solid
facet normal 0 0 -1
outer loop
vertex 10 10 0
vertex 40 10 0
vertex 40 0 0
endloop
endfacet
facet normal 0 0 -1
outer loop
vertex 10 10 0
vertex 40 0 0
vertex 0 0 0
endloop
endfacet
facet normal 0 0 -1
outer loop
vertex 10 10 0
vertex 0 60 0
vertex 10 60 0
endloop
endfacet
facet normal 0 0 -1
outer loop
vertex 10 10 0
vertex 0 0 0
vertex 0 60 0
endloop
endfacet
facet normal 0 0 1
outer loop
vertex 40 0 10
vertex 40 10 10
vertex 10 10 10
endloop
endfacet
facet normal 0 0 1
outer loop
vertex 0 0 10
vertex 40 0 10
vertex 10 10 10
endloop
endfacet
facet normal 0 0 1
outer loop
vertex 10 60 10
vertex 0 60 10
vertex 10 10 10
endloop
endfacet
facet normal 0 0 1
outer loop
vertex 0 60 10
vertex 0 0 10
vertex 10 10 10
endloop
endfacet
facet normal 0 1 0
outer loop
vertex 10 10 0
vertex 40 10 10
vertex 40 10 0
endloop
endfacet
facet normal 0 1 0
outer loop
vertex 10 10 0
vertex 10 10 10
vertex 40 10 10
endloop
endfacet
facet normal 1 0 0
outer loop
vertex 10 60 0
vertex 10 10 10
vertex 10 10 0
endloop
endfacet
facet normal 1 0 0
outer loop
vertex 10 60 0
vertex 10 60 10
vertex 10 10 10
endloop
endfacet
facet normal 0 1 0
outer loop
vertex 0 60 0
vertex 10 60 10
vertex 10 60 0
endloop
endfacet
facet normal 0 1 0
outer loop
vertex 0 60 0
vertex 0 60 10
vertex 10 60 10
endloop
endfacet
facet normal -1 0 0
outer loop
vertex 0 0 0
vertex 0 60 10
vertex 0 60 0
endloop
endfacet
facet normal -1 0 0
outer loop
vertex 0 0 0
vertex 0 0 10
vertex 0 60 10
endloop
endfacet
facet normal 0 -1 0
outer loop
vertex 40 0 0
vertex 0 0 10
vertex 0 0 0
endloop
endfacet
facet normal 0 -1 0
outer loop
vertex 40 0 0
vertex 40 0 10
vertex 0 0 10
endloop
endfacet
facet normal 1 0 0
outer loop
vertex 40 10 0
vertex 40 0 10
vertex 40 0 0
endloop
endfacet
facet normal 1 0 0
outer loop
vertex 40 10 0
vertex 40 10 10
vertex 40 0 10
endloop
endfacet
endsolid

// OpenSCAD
// Generated by Parametrix
ca_lettreL_face1_000 = [ [ 0.0000, 0.0000 ],[ 40.0000, 0.0000 ],[ 40.0000, 10.0000 ],[ 10.0000, 10.0000 ],[ 10.0000, 60.0000 ],[ 0.0000, 60.0000 ],[ 0.0000, 0.0000 ] ];
cb_lettreL_face1_000 = [  0, 1, 2, 3, 4, 5, 6 ];
a_lettreL_face1 = concat(ca_lettreL_face1_000);
b_lettreL_face1 = [cb_lettreL_face1_000];

module subpax_lettreL () {
	translate( [ 0, 0, 0 ])
		rotate( [ 0, 0, 0 ])
			   linear_extrude(height = 10) polygon(a_lettreL_face1, b_lettreL_face1);
}

module pax_lettreL () {
	subpax_lettreL();
}

pax_lettreL();
